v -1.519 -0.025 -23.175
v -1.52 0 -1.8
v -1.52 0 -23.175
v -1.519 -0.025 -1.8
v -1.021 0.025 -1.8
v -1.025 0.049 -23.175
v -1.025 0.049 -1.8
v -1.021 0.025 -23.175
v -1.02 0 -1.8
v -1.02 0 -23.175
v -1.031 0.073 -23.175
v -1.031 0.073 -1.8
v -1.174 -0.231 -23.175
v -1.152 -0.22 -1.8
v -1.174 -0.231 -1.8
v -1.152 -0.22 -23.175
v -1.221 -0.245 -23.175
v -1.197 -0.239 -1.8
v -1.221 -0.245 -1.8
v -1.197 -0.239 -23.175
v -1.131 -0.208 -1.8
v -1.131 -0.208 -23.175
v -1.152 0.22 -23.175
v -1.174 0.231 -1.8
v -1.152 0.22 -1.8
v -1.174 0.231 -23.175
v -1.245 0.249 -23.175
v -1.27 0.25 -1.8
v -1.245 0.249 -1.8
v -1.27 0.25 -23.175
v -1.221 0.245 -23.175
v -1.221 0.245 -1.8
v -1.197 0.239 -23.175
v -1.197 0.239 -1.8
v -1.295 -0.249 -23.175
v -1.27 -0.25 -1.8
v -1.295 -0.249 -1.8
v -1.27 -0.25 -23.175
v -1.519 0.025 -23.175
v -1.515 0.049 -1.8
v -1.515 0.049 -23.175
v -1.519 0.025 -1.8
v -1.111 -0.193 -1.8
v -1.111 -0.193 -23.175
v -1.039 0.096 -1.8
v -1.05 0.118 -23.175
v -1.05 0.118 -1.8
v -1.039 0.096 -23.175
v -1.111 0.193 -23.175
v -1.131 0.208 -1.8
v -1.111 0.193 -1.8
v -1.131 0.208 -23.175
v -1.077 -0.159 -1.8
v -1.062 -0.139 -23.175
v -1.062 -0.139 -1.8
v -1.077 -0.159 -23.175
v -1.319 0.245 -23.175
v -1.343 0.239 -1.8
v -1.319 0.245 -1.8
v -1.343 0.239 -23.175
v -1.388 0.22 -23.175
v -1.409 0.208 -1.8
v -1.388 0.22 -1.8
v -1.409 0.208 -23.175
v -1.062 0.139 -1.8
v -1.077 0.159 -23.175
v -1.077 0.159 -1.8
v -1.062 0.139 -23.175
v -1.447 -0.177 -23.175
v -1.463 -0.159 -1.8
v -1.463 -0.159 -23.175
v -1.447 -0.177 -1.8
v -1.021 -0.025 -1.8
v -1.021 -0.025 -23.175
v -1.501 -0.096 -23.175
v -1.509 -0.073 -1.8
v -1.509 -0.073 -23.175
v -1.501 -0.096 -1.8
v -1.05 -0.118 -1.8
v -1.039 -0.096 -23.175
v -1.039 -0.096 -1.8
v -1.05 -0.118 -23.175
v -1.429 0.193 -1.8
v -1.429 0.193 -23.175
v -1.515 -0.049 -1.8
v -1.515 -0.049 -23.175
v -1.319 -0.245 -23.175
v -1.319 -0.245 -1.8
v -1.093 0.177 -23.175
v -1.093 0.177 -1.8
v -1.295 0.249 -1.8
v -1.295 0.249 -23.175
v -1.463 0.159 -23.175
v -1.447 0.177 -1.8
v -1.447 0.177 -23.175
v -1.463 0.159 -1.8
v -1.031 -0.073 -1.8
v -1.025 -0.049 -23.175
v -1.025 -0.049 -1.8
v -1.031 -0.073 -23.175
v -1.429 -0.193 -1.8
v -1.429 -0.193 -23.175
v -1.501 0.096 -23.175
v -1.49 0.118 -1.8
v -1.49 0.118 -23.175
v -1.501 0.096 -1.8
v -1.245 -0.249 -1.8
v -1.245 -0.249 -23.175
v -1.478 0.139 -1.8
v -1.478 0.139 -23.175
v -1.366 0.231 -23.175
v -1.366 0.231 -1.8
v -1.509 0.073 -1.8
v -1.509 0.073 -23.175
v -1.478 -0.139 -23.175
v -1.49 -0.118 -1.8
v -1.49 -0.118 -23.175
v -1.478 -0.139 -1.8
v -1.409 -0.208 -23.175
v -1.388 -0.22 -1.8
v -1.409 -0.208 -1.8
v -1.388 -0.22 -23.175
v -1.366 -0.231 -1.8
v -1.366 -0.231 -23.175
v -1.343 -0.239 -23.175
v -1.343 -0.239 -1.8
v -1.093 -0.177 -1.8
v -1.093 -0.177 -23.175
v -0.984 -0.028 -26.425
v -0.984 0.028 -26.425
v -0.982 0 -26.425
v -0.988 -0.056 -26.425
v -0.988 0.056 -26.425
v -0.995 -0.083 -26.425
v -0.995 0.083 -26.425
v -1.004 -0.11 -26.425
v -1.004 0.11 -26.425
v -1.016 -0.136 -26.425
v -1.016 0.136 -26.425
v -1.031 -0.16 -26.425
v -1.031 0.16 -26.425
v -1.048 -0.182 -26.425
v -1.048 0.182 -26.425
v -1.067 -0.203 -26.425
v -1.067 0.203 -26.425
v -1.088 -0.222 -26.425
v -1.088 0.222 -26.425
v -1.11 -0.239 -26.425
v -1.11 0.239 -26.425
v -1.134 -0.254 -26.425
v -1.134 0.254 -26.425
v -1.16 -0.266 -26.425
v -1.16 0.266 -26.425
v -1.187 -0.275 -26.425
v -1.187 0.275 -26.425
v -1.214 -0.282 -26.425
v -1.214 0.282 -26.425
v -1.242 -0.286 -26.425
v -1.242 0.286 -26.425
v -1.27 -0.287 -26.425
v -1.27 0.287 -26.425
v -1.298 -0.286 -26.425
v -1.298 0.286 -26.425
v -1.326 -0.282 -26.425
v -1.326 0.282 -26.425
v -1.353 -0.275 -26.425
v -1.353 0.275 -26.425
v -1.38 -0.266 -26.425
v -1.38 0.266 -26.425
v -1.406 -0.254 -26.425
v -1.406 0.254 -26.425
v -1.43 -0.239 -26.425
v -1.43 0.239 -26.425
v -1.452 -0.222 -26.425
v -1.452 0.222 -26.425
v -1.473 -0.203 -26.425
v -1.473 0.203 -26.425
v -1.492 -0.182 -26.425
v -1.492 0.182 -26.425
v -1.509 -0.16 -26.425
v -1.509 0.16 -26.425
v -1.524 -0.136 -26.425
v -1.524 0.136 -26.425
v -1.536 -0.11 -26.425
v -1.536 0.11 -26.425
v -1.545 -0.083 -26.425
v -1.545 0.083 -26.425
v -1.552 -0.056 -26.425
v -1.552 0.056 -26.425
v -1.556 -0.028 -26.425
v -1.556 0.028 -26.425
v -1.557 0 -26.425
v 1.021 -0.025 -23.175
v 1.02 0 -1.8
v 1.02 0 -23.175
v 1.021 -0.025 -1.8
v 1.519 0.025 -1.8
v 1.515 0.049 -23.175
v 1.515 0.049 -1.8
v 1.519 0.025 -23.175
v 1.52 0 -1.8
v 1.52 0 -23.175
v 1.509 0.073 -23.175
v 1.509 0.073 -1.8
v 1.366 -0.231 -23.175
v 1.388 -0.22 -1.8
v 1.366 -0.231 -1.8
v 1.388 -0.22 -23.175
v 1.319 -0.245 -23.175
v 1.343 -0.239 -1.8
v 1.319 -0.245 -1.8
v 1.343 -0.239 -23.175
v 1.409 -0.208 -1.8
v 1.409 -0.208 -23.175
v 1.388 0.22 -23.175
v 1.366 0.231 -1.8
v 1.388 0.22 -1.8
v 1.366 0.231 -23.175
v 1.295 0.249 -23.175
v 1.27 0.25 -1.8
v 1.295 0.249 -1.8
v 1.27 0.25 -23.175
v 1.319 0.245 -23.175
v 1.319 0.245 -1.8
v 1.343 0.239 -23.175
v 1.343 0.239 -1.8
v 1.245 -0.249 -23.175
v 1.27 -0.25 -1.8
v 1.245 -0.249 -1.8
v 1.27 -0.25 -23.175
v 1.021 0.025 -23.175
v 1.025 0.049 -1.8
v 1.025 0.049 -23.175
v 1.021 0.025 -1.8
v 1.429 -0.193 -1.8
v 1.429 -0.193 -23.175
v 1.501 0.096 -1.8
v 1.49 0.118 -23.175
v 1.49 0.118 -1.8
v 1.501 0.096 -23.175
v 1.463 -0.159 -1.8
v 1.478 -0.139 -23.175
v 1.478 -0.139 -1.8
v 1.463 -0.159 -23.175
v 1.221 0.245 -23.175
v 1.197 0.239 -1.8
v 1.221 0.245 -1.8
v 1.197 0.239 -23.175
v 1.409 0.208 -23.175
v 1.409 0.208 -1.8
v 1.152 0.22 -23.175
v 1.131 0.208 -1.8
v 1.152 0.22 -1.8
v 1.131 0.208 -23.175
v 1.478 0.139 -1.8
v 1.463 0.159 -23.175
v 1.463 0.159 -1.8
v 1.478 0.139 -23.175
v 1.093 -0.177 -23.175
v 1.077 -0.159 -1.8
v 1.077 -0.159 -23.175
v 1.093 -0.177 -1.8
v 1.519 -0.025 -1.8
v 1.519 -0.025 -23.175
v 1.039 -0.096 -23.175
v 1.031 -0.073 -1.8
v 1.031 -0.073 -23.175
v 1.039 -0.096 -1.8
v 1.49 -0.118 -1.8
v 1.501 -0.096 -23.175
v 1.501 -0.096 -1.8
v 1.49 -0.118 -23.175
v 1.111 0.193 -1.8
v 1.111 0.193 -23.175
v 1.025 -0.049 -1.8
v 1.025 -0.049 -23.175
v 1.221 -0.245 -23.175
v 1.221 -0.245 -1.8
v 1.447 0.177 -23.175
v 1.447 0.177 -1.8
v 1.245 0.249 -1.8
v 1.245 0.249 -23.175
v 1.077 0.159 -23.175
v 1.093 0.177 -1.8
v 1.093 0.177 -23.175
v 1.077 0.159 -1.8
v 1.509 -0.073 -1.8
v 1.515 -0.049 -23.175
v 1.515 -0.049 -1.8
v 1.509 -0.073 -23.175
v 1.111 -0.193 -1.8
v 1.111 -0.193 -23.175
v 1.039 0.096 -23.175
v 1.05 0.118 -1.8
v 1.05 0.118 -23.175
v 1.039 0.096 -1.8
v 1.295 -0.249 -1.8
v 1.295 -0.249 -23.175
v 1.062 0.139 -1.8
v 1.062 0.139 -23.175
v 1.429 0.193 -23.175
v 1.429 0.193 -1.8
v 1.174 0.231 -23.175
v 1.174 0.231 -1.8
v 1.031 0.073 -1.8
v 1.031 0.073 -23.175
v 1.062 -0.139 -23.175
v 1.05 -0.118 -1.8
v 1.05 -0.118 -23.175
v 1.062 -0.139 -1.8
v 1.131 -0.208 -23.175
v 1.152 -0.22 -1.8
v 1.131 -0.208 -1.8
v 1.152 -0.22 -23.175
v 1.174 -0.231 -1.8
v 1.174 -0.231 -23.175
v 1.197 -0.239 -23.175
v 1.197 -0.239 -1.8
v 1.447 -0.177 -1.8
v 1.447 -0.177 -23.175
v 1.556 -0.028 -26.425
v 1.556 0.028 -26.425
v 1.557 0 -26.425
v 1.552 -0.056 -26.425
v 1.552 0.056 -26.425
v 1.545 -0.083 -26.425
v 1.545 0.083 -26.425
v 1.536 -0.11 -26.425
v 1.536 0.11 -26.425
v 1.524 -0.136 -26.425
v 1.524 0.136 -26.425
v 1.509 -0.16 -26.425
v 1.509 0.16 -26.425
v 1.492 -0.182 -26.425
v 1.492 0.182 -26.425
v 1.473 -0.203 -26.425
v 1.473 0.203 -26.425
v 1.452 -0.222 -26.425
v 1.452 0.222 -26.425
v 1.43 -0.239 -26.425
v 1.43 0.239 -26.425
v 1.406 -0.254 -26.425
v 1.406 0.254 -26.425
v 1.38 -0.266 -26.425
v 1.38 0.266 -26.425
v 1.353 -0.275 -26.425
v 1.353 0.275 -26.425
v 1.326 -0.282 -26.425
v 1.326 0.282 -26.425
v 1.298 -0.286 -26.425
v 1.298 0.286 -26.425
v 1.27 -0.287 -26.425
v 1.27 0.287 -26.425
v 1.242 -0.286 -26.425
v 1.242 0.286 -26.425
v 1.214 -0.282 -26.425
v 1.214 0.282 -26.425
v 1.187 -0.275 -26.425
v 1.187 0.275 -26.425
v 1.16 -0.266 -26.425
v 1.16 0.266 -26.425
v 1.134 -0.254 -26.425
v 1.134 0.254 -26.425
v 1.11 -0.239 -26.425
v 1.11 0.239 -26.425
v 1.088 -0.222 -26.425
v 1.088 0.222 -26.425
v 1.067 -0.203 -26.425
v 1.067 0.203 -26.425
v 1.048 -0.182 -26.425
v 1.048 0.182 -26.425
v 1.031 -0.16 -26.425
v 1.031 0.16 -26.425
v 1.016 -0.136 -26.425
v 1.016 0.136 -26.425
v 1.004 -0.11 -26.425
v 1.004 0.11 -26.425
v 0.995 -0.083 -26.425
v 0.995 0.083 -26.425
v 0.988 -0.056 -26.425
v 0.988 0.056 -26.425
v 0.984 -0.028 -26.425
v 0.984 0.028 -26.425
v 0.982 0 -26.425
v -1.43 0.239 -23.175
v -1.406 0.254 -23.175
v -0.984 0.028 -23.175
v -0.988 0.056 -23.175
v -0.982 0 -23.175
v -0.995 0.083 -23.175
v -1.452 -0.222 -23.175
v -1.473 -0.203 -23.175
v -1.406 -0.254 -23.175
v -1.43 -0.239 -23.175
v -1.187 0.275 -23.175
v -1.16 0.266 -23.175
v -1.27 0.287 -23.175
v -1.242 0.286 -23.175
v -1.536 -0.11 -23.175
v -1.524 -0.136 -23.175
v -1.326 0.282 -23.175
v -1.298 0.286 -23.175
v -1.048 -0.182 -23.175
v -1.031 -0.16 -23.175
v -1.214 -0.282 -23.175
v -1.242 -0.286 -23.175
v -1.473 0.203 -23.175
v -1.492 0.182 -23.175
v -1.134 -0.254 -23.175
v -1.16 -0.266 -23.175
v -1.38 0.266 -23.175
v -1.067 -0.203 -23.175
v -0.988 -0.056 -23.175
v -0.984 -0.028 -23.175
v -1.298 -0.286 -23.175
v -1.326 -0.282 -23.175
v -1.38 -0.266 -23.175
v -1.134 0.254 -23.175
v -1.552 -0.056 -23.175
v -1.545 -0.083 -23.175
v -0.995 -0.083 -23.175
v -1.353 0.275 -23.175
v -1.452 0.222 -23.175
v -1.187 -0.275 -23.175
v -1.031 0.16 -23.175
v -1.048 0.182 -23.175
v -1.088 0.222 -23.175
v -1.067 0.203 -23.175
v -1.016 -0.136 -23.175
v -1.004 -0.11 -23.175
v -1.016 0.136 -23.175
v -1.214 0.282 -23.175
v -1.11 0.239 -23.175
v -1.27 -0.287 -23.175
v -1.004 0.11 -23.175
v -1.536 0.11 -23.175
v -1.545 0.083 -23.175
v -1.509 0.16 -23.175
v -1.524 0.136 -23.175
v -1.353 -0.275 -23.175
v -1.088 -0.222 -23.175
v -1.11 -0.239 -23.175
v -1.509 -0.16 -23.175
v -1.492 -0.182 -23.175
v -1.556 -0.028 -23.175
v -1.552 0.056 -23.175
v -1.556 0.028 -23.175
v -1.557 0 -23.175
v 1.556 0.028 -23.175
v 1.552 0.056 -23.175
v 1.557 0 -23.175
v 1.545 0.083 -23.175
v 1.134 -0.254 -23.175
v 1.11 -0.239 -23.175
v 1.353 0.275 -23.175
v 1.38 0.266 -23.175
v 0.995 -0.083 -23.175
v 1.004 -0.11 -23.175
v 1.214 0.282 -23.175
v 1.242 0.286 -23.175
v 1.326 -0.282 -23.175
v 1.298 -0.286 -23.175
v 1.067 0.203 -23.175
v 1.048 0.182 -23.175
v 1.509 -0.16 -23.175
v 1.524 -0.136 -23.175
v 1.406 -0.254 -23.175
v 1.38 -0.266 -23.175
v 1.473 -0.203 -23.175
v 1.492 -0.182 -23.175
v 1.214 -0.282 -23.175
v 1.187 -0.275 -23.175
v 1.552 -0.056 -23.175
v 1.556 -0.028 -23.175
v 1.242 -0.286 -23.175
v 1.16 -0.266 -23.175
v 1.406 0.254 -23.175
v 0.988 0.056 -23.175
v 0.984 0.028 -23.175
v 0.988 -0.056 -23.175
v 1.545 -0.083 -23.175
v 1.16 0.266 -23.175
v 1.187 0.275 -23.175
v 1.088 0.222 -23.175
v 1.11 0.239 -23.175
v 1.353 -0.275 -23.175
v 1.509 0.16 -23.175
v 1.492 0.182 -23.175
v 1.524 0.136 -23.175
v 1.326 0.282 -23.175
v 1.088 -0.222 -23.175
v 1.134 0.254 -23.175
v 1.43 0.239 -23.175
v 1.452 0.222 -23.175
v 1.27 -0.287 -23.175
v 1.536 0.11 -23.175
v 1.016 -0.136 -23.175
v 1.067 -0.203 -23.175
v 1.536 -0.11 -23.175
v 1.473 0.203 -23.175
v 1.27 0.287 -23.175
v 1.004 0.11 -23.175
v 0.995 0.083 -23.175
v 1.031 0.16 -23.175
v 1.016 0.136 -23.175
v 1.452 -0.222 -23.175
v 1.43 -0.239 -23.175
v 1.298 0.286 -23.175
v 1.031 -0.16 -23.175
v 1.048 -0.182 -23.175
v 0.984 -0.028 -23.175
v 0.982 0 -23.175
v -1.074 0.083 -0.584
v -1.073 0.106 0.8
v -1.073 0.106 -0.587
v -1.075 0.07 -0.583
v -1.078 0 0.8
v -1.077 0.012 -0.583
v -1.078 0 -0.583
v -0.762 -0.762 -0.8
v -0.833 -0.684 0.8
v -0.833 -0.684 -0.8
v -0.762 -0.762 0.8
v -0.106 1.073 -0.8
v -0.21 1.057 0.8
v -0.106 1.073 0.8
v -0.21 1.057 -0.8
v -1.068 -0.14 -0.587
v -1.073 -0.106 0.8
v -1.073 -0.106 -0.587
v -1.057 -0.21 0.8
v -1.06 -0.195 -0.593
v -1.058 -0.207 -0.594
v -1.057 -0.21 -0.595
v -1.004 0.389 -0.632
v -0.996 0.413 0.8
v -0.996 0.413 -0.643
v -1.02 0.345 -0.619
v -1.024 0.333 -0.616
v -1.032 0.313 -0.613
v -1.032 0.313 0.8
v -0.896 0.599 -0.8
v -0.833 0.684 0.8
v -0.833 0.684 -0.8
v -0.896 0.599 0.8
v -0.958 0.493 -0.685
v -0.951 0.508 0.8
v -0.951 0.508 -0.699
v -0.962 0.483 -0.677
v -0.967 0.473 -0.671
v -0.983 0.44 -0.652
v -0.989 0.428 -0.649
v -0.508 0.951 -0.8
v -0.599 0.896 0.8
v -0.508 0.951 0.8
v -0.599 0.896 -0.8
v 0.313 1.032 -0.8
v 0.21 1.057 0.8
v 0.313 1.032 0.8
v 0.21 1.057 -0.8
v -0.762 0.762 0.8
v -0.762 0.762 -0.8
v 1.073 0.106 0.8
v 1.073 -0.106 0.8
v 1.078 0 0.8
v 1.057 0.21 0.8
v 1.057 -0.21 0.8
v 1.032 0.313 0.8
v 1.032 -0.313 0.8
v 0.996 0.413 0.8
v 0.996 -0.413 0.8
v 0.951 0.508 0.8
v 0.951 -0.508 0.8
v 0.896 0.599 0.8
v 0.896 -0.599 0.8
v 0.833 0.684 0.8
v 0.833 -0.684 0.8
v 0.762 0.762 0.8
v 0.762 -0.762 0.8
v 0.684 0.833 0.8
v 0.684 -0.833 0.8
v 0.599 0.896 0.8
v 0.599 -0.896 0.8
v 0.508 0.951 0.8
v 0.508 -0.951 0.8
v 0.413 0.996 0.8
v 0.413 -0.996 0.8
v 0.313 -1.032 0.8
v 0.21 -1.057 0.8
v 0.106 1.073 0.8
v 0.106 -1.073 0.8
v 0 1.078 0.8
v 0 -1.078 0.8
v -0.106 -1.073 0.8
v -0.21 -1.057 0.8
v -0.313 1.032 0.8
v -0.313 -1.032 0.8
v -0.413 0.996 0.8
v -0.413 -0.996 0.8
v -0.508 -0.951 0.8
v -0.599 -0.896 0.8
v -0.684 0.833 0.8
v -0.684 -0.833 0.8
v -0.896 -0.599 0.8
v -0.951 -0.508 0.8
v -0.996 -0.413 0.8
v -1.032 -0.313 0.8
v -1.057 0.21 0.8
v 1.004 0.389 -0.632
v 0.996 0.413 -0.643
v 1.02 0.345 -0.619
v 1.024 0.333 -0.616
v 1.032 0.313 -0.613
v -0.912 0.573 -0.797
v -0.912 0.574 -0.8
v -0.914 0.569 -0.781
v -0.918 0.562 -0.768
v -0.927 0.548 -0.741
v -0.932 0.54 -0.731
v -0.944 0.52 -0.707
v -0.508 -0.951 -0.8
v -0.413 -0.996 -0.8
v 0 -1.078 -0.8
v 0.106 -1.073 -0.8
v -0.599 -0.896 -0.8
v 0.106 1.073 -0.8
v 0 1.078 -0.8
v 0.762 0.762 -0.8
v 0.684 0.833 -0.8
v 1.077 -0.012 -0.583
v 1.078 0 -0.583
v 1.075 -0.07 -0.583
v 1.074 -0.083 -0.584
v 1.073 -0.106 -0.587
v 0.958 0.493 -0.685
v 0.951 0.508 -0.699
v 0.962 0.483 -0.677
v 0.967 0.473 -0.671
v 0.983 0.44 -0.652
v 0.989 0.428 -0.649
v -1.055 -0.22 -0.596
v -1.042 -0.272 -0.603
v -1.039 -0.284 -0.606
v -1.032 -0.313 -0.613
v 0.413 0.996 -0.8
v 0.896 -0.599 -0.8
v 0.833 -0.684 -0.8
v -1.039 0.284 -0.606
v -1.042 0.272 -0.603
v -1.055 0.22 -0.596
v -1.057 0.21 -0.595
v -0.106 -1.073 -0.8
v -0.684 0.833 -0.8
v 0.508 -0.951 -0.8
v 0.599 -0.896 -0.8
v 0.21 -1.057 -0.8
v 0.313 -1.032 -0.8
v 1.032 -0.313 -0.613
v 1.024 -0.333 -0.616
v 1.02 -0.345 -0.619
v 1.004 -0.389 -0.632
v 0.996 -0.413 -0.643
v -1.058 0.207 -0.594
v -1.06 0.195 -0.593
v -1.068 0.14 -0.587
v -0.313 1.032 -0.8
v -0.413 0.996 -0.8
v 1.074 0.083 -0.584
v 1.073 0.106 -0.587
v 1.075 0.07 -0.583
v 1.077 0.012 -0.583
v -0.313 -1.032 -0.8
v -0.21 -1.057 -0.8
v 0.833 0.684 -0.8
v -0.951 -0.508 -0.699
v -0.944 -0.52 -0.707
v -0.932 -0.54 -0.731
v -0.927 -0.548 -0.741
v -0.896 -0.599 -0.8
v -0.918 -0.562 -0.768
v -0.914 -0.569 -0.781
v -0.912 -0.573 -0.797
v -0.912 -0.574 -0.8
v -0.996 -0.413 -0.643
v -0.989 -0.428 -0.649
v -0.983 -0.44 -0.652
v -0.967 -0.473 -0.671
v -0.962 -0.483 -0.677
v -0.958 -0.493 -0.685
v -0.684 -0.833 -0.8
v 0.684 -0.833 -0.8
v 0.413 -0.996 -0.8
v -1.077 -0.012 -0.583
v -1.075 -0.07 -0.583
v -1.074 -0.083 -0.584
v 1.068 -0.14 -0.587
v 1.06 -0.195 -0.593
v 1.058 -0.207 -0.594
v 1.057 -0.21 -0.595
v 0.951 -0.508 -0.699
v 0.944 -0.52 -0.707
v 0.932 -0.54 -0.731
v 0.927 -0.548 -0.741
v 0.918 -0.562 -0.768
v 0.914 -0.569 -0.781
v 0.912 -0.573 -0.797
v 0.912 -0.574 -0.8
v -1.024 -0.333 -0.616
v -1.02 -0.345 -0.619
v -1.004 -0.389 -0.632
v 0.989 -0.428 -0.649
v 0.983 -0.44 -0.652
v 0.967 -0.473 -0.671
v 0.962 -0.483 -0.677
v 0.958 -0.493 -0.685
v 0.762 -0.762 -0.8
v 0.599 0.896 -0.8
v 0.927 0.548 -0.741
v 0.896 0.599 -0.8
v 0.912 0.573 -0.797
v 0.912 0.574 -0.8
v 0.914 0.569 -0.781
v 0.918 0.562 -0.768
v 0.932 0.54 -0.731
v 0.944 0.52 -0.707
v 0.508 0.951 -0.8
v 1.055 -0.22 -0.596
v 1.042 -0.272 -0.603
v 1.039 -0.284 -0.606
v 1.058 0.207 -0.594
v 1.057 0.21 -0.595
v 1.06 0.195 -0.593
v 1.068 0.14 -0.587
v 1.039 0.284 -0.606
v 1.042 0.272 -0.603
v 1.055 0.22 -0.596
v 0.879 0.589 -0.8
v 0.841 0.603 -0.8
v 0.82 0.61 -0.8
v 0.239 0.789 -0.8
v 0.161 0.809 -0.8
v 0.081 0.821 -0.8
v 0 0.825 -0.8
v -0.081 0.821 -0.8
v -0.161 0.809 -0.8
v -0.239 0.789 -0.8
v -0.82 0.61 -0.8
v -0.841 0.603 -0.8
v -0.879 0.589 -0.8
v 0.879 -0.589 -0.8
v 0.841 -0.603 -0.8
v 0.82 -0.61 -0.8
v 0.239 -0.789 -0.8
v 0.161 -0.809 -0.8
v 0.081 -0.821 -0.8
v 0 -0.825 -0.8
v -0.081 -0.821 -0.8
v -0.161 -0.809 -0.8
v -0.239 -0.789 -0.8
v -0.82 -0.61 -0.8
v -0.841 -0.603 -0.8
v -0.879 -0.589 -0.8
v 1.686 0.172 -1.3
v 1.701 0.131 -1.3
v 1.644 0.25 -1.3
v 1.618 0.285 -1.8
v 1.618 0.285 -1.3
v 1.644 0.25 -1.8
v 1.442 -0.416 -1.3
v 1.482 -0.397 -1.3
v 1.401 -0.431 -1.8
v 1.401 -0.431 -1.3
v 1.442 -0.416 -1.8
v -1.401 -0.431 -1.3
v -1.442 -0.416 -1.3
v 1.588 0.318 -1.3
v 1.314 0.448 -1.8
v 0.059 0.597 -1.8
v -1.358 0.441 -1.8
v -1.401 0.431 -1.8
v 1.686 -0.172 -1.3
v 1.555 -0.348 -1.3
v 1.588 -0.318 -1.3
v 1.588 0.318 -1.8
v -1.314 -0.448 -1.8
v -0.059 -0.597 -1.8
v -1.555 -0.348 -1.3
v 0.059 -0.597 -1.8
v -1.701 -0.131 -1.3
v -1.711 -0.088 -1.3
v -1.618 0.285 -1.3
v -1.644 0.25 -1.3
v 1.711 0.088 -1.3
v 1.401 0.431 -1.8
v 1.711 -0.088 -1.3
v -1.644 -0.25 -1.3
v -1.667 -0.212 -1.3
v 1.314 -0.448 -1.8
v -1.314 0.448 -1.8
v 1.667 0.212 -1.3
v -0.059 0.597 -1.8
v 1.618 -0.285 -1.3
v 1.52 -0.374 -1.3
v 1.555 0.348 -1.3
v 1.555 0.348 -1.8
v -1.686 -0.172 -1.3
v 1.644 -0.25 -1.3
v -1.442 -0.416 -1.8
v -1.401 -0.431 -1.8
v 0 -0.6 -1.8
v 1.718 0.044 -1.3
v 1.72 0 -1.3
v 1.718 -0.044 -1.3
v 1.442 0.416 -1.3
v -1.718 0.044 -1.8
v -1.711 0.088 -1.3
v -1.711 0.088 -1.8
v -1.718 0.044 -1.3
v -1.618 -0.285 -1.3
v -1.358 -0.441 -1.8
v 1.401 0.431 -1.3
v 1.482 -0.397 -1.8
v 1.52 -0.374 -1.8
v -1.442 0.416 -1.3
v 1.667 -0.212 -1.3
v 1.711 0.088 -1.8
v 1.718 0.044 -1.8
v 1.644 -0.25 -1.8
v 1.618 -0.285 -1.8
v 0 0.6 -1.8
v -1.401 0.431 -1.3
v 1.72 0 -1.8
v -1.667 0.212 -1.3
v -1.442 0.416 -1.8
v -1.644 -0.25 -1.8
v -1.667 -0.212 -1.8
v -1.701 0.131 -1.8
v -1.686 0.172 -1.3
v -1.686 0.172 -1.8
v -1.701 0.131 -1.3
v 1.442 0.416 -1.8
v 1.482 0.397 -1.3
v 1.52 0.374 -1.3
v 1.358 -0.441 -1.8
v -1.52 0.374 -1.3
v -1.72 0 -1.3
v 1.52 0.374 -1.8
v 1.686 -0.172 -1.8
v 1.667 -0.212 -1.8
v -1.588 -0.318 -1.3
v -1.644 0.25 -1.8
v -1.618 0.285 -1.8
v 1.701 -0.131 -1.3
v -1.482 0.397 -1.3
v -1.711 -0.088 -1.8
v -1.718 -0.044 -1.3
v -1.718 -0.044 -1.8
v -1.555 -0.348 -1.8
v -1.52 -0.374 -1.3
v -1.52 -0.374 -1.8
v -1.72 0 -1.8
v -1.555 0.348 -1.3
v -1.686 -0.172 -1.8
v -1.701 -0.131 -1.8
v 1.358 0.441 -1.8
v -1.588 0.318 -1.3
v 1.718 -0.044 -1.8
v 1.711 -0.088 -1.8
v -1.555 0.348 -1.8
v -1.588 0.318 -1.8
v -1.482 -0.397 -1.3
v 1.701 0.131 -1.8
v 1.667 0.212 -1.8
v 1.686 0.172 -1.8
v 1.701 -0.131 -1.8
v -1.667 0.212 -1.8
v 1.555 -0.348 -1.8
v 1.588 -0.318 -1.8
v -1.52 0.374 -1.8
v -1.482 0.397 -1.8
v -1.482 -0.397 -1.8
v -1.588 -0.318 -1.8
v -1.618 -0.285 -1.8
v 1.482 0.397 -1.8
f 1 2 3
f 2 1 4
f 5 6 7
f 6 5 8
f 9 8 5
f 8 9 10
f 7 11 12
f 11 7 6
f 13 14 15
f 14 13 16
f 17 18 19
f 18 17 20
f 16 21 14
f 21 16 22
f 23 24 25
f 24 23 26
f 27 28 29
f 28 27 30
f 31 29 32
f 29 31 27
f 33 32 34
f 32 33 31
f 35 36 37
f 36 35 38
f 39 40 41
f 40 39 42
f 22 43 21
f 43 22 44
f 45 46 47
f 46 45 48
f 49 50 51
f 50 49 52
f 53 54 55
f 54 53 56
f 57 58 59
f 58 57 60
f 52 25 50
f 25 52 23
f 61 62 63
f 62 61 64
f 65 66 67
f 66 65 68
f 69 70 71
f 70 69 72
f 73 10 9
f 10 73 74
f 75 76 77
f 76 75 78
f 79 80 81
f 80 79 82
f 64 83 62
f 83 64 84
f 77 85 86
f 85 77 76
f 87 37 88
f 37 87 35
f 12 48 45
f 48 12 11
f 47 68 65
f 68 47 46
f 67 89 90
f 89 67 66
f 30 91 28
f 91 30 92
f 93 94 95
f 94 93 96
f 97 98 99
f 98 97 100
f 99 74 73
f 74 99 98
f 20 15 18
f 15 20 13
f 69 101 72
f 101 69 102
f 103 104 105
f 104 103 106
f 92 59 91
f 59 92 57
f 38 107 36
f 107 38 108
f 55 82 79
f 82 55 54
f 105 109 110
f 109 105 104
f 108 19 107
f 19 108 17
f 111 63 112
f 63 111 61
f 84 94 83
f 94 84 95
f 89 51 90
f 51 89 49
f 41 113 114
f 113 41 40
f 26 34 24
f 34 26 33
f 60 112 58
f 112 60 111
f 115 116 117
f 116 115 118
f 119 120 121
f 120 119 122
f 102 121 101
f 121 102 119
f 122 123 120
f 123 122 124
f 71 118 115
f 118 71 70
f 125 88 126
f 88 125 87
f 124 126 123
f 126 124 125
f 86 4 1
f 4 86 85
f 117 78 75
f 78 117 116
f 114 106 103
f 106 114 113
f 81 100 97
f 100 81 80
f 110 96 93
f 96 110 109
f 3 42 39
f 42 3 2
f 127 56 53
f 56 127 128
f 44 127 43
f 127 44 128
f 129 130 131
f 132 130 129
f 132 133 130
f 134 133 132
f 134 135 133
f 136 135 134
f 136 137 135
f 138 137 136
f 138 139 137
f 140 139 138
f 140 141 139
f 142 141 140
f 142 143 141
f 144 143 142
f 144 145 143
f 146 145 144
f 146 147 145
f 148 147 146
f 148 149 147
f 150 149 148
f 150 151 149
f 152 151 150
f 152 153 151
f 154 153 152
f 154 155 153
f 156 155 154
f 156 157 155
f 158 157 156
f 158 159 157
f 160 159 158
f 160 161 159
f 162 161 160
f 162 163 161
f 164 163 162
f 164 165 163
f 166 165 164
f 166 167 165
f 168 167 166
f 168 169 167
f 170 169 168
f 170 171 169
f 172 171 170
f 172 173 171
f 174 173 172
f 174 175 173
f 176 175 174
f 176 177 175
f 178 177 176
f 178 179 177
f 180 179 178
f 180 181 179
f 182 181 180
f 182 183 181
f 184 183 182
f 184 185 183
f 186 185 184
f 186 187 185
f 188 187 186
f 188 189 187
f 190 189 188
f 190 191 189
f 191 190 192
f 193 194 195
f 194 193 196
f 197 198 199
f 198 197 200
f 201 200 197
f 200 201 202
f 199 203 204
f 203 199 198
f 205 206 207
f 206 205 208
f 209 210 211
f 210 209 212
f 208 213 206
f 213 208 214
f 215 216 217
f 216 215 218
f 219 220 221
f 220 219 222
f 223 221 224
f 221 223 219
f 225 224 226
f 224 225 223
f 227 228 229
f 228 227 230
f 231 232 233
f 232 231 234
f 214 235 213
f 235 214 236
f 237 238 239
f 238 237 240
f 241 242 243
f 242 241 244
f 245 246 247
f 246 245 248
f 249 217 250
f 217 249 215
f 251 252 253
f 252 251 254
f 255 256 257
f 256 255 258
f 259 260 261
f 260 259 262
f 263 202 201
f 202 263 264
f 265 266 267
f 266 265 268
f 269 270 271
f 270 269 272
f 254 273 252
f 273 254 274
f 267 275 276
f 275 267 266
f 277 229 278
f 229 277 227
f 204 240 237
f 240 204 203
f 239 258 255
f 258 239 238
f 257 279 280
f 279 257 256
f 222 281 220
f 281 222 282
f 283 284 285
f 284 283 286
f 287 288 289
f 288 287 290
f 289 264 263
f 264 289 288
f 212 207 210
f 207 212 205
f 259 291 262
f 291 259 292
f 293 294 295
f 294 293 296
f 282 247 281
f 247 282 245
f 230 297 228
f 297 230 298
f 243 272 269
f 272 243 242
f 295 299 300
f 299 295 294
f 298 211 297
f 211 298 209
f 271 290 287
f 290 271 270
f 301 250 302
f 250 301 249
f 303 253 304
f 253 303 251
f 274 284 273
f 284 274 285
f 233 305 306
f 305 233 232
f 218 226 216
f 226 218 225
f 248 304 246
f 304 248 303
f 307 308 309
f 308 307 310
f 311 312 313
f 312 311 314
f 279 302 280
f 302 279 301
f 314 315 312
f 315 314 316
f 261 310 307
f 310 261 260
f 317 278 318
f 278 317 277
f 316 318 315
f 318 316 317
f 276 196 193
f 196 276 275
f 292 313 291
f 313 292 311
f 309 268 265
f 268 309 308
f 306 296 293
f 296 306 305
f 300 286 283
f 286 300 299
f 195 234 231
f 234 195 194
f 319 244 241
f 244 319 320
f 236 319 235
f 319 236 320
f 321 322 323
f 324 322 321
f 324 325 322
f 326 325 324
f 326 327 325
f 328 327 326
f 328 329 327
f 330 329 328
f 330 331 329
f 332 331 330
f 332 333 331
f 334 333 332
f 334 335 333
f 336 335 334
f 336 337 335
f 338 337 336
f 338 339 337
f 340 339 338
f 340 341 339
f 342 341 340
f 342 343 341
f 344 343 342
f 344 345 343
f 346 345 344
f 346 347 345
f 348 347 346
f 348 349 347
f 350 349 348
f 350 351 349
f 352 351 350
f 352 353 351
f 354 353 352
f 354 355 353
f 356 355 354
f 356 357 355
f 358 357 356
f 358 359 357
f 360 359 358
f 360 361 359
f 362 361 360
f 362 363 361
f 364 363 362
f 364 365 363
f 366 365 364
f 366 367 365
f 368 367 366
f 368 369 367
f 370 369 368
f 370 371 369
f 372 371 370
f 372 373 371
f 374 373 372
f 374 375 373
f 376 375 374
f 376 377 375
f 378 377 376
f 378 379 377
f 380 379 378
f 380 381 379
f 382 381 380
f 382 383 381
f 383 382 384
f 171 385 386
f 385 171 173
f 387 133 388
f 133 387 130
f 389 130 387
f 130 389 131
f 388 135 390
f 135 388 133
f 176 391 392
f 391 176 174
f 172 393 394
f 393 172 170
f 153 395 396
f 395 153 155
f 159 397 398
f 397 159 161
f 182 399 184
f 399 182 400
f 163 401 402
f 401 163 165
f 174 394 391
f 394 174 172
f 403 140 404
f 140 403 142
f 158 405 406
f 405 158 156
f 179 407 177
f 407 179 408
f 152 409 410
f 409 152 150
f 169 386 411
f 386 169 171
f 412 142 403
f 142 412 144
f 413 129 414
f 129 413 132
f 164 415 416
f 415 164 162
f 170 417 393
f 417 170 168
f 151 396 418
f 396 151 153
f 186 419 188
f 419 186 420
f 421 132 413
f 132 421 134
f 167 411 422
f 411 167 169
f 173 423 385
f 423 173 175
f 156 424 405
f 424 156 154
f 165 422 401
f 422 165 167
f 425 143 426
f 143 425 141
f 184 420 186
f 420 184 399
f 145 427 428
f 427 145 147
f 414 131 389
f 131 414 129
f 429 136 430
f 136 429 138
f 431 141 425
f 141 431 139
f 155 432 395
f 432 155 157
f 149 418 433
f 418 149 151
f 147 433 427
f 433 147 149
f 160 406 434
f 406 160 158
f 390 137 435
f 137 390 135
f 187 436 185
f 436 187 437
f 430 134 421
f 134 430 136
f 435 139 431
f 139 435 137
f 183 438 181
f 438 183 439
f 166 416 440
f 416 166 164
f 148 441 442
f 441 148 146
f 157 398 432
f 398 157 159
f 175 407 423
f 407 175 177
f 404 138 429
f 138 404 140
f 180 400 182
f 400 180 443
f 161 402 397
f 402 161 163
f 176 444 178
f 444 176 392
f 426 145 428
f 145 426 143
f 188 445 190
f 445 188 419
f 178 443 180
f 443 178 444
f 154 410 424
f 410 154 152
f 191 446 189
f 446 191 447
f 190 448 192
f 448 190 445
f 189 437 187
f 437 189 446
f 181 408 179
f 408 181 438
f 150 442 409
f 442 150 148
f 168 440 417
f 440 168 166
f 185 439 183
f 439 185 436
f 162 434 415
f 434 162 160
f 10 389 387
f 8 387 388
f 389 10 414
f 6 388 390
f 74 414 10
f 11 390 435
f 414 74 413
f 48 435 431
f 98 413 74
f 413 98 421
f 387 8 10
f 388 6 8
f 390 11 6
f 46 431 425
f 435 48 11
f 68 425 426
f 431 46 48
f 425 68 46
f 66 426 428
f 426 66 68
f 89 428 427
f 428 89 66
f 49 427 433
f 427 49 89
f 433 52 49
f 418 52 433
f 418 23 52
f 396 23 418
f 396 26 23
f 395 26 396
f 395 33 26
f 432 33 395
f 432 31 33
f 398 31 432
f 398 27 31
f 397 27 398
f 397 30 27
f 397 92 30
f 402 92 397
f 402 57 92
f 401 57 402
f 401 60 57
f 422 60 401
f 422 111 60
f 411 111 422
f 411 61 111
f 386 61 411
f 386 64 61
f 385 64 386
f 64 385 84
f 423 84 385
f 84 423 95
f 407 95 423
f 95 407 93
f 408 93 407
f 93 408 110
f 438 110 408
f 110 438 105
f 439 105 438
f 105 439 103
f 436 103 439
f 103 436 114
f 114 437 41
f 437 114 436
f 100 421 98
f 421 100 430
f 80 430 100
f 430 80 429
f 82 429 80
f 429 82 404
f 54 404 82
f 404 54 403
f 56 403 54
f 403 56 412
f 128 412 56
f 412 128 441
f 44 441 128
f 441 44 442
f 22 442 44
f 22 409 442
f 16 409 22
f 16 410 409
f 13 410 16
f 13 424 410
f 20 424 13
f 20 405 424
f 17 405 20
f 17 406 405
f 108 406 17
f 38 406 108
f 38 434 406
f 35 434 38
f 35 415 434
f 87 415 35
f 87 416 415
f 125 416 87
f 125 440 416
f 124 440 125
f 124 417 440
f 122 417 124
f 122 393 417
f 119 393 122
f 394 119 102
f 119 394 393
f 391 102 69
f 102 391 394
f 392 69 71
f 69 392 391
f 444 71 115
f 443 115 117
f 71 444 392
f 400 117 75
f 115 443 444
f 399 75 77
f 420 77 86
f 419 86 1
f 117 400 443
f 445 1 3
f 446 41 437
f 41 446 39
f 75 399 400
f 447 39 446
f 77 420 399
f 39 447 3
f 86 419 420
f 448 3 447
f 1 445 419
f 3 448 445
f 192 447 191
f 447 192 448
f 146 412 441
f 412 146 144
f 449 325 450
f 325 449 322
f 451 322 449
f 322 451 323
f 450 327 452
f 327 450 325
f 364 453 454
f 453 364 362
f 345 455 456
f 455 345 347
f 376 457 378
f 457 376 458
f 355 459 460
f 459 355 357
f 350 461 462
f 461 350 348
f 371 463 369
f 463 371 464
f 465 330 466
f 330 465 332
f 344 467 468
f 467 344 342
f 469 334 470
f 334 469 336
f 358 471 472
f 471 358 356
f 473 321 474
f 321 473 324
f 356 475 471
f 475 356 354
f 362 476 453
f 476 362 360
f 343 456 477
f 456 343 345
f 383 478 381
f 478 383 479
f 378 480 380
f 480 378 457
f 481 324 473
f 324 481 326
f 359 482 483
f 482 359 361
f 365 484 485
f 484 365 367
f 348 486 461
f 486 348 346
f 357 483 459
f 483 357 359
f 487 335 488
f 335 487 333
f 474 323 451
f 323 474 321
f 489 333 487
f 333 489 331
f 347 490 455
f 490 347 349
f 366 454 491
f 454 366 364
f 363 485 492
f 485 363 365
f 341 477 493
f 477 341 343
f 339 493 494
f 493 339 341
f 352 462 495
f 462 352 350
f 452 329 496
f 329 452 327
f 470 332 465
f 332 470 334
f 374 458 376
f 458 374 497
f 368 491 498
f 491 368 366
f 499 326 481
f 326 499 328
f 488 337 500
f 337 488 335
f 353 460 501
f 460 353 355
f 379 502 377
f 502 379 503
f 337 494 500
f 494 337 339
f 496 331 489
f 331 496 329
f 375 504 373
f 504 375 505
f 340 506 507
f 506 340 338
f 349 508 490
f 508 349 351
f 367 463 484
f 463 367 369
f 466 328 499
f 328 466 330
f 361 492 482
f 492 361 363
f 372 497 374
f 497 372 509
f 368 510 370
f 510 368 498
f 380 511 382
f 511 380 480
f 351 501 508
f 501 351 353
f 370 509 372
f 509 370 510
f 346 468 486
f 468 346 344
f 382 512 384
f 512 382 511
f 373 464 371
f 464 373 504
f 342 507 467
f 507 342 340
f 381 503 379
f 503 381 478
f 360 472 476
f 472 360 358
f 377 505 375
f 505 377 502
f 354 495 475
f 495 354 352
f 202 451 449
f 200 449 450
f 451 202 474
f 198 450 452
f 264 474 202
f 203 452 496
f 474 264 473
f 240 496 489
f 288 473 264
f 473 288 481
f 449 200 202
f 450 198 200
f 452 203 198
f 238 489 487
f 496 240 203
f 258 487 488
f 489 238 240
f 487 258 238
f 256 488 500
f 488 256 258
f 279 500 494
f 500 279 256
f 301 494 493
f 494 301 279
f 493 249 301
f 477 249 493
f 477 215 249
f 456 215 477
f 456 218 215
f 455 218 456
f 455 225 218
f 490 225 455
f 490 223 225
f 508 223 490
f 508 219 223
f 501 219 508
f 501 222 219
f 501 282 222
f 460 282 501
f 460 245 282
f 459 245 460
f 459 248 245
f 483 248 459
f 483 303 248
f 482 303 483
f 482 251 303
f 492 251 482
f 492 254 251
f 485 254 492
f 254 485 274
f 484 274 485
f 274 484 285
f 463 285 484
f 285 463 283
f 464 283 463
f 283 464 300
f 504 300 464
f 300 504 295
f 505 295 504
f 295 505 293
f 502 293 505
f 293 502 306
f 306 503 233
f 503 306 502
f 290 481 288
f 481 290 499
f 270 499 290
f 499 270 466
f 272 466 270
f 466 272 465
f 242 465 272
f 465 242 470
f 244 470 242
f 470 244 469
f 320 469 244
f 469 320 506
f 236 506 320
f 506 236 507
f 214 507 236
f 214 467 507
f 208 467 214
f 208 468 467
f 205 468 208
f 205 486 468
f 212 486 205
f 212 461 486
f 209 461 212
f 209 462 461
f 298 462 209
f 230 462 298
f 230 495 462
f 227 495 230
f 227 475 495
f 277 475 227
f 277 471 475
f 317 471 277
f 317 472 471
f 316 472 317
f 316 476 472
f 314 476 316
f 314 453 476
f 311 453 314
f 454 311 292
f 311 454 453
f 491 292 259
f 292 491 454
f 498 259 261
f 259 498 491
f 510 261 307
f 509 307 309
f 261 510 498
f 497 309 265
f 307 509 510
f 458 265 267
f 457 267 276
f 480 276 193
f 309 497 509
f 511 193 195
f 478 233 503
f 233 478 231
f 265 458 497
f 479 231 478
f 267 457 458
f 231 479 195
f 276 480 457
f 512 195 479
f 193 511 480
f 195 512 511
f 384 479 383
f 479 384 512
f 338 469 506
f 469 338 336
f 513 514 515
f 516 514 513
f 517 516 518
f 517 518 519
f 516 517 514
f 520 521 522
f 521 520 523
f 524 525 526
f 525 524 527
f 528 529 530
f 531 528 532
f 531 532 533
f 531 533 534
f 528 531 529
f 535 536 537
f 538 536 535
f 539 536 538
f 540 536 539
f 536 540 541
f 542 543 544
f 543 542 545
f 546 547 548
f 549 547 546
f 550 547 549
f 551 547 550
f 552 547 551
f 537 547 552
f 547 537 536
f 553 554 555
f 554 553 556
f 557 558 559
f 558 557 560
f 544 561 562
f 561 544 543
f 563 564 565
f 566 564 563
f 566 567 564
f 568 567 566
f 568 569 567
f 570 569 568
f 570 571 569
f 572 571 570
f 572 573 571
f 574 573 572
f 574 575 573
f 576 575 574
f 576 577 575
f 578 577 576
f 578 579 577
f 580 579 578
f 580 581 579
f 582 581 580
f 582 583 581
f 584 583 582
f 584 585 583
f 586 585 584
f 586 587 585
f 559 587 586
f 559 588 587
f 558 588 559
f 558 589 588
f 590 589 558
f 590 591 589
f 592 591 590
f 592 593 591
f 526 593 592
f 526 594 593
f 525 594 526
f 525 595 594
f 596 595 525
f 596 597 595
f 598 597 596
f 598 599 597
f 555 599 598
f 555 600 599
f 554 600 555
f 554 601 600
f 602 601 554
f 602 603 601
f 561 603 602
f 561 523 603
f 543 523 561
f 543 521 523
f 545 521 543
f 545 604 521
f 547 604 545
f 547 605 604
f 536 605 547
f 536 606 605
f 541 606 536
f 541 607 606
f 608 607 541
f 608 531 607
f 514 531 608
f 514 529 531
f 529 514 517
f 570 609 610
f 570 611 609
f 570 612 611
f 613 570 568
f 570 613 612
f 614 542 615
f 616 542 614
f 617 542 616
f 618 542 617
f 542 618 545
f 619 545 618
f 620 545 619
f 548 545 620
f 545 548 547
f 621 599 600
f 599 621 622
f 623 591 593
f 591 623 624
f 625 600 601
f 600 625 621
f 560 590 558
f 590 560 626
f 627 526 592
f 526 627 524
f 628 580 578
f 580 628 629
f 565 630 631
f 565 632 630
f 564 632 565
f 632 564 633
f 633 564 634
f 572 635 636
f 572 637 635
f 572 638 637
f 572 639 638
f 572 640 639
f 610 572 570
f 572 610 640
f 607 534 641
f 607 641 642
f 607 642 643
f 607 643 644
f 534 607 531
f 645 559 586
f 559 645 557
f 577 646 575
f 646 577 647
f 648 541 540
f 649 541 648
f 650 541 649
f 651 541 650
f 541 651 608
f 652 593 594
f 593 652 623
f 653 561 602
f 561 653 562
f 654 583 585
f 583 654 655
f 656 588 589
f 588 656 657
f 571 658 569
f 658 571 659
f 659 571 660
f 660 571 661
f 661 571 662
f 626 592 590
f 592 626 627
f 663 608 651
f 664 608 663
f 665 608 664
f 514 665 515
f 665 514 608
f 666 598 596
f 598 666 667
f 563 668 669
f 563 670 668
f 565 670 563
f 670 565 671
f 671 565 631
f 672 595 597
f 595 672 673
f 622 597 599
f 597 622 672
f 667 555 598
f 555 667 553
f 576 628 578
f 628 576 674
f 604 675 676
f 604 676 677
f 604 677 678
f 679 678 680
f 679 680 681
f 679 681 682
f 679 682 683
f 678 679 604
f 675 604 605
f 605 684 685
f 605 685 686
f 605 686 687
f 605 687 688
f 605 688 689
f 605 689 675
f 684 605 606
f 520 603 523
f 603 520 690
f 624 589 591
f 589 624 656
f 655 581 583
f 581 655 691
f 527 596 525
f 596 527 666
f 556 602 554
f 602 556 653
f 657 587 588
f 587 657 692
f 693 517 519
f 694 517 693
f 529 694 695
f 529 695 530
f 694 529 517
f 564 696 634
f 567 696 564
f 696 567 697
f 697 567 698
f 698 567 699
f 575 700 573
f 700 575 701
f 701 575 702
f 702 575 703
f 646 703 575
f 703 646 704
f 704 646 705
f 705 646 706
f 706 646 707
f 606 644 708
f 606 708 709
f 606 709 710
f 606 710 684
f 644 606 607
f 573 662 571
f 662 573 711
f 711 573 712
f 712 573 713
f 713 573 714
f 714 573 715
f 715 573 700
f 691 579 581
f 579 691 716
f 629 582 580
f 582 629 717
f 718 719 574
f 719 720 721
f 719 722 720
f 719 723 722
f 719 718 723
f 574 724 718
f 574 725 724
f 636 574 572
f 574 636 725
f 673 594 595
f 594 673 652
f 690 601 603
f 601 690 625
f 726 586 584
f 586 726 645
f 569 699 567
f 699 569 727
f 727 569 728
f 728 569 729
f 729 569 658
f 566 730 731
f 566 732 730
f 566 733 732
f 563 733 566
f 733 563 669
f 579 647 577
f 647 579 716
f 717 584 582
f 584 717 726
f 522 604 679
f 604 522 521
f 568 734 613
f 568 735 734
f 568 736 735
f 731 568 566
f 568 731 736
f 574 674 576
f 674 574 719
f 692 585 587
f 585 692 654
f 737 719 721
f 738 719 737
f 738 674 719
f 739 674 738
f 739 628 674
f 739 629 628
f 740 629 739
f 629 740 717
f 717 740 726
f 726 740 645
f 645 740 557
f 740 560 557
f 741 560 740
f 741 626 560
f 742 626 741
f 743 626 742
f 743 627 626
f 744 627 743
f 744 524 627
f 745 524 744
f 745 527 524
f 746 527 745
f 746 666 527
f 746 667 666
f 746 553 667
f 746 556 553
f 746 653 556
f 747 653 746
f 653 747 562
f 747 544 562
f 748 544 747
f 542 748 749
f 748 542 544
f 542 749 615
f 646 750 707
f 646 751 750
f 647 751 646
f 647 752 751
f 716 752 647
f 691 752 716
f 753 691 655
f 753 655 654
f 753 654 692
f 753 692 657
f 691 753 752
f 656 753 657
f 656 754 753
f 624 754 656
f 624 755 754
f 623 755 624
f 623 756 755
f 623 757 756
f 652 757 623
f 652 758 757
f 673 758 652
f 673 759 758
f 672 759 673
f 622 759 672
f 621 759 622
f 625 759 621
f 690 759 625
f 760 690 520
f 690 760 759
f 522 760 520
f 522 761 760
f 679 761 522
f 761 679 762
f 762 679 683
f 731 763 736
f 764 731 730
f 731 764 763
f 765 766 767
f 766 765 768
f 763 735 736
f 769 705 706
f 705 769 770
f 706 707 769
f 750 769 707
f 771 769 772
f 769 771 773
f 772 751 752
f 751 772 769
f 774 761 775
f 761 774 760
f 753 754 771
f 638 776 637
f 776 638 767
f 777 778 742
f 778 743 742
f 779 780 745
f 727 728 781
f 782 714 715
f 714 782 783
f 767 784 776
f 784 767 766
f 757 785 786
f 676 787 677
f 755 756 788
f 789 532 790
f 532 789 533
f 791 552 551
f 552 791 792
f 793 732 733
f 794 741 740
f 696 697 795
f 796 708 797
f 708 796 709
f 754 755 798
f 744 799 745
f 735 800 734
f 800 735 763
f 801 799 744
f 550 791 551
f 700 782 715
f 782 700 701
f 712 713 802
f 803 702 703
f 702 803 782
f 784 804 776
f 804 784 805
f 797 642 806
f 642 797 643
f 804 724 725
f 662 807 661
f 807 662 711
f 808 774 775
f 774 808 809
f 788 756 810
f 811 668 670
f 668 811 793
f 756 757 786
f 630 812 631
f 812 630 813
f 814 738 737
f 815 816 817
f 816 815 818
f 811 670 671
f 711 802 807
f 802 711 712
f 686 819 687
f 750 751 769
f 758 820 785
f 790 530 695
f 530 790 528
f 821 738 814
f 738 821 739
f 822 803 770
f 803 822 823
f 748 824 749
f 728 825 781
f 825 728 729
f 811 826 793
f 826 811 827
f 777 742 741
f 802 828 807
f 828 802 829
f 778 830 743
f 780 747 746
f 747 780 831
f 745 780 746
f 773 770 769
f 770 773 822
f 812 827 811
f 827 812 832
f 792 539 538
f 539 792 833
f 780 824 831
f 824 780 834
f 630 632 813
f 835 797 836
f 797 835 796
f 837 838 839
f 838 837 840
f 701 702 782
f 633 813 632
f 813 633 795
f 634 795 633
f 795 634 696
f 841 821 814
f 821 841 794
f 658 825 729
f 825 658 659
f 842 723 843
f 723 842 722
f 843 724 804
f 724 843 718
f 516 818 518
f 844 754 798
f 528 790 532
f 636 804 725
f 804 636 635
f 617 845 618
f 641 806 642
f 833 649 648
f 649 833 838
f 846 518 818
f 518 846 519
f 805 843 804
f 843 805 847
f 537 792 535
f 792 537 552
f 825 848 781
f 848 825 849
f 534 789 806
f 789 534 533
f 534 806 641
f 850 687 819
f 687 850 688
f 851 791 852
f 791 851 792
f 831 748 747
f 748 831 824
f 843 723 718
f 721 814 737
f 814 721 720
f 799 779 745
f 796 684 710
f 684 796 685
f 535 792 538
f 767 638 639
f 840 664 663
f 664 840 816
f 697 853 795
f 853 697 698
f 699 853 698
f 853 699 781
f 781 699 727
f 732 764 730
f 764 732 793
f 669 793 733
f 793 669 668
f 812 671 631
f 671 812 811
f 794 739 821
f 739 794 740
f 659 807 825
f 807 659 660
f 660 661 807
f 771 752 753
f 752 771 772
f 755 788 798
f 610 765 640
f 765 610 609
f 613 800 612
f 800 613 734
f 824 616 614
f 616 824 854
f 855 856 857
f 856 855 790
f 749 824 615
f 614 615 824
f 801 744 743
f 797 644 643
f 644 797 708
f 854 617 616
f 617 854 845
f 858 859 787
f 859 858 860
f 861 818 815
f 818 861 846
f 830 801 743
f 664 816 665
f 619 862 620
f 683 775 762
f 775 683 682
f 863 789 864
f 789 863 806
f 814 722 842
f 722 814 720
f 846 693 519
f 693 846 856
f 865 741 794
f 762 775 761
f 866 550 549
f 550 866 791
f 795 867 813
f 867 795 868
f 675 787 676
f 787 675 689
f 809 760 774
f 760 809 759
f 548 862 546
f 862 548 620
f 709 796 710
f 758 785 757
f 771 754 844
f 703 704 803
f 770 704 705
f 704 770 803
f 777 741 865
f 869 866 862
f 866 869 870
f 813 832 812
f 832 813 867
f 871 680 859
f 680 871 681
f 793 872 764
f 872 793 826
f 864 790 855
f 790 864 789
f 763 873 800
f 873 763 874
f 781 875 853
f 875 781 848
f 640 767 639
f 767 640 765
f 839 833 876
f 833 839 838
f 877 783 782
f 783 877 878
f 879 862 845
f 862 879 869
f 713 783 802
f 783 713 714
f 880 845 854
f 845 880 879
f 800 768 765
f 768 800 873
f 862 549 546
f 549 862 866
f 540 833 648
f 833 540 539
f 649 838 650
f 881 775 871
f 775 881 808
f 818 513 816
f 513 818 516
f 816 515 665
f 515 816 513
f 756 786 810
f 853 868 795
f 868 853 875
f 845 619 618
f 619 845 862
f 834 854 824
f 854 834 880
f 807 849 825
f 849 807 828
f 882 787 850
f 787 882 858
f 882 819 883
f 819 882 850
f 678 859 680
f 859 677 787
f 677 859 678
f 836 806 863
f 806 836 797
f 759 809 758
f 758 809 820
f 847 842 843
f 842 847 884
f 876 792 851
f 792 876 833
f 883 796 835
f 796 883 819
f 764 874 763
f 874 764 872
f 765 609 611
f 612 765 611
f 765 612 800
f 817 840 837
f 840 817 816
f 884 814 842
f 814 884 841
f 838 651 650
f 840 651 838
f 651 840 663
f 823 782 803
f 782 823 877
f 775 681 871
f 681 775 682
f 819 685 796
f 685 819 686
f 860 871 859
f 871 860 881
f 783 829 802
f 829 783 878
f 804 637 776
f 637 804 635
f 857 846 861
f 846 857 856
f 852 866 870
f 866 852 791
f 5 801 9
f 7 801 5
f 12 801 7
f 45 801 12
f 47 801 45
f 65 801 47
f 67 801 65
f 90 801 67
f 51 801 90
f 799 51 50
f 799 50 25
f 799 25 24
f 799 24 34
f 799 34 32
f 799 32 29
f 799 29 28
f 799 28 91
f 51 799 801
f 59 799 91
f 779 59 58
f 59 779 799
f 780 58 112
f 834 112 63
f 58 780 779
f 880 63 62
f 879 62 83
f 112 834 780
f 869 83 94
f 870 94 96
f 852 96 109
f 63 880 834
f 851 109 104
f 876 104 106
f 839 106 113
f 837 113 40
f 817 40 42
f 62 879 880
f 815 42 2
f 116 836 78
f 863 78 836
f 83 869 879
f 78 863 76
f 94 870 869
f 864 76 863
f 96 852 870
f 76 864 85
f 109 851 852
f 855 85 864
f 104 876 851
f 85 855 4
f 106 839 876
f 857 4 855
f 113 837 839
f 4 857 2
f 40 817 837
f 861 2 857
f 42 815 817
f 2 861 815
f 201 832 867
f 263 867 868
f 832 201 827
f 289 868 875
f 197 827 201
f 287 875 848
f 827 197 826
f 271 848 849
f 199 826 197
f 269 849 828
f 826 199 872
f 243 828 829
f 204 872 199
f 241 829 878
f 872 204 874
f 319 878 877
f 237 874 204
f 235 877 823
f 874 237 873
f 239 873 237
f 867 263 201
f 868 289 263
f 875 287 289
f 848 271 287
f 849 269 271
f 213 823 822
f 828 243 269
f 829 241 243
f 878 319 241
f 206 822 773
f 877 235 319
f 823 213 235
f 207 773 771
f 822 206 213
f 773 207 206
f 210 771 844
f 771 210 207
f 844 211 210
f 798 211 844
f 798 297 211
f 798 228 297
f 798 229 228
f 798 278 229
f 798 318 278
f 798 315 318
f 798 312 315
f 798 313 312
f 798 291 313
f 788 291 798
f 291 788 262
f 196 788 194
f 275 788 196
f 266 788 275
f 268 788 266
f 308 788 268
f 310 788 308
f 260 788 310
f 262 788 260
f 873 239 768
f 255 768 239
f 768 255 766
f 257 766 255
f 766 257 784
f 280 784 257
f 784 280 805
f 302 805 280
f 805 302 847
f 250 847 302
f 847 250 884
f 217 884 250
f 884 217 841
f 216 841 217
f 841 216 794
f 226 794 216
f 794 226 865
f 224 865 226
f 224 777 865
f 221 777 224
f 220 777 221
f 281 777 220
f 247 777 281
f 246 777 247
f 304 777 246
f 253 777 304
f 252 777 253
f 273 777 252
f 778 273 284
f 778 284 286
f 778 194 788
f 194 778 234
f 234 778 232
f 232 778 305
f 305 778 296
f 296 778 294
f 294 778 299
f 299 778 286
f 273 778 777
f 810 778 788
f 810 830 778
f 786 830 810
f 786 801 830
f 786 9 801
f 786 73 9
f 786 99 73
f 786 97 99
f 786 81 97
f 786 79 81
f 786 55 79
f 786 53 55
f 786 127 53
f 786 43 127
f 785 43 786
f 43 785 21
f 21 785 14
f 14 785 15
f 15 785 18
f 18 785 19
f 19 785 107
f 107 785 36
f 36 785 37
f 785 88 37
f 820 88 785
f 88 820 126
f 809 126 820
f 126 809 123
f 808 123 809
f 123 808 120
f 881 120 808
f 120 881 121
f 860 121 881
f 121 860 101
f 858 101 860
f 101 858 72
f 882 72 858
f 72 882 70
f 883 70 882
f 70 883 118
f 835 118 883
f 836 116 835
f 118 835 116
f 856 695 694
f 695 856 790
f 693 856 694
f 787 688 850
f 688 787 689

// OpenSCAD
// Honeywell 135-104LAC-J01 style radial bead thermistor (approximate geometry)
// One connected solid; all placements derived from dimensions (no arbitrary offsets)

$fn = 64;

// Parameters (mm)
bead_d = 2.2;                 //[1.1:4.4:0.1]
bead_t = 1.6;                 //[0.8:3.2:0.1]  // bead thickness (disc-like)
neck_d = 1.2;                 //[0.6:2.4:0.05] // epoxy neck around lead exits
neck_len = 1.0;               //[0.5:2.5:0.1]

lead_d = 0.5;                 //[0.25:1.0:0.05]
lead_len = 25.0;              //[12.5:50.0:0.5]
lead_pitch = 2.54;            //[1.27:5.08:0.01]

tinning_len = 3.0;            //[1.5:6.0:0.5]
tinning_d_factor = 1.15;      //[1.0:1.4:0.05]

overlap = 0.25;               //[0.1:1.0:0.05] // small overlap to guarantee manifold union

// Derived
bead_r = bead_d/2;
neck_r = neck_d/2;
lead_r = lead_d/2;

z_bead_top = bead_t/2;
z_bead_bot = -bead_t/2;

z_neck_top = z_bead_bot + overlap;                 // neck starts slightly inside bead
z_neck_bot = z_neck_top - neck_len;

z_lead_top = z_neck_bot + overlap;                 // lead starts slightly inside neck
z_lead_bot = z_lead_top - lead_len;

z_tin_top = z_lead_bot + tinning_len;              // tinning at lead tip
z_tin_center = z_lead_bot + tinning_len/2;

// Geometry
module bead_disc() {
  // Disc-like bead with slight rounding using hull of two thin cylinders
  color([0.85, 0.85, 0.8])
  hull() {
    translate([0,0, z_bead_top - 0.15])
      cylinder(r=bead_r*0.98, h=0.3, center=true);
    translate([0,0, z_bead_bot + 0.15])
      cylinder(r=bead_r*0.98, h=0.3, center=true);
  }
}

module neck_and_exit() {
  // Epoxy neck that blends from bead to lead exits (two lobes + center)
  color([0.85, 0.85, 0.8])
  hull() {
    // inside bead
    translate([0,0, z_bead_bot + overlap])
      cylinder(r=bead_r*0.75, h=overlap*2, center=true);

    // neck bottom
    translate([0,0, z_neck_bot])
      cylinder(r=neck_r, h=overlap*2, center=true);

    // lobe around each lead at neck bottom
    for (sx = [-1, 1])
      translate([sx*lead_pitch/2, 0, z_neck_bot])
        cylinder(r=max(neck_r*0.75, lead_r*1.6), h=overlap*2, center=true);
  }
}

module lead_pair() {
  color([0.2, 0.2, 0.2])
  for (sx = [-1, 1]) {
    translate([sx*lead_pitch/2, 0, (z_lead_top + z_lead_bot)/2])
      cylinder(r=lead_r, h=(z_lead_top - z_lead_bot) + overlap, center=true);
  }
}

module tinning() {
  color([0.72, 0.45, 0.2])
  for (sx = [-1, 1]) {
    translate([sx*lead_pitch/2, 0, z_tin_center])
      cylinder(r=lead_r*tinning_d_factor, h=tinning_len + overlap, center=true);
  }
}

// Final connected solid
union() {
  bead_disc();
  neck_and_exit();
  lead_pair();
  tinning();
}
